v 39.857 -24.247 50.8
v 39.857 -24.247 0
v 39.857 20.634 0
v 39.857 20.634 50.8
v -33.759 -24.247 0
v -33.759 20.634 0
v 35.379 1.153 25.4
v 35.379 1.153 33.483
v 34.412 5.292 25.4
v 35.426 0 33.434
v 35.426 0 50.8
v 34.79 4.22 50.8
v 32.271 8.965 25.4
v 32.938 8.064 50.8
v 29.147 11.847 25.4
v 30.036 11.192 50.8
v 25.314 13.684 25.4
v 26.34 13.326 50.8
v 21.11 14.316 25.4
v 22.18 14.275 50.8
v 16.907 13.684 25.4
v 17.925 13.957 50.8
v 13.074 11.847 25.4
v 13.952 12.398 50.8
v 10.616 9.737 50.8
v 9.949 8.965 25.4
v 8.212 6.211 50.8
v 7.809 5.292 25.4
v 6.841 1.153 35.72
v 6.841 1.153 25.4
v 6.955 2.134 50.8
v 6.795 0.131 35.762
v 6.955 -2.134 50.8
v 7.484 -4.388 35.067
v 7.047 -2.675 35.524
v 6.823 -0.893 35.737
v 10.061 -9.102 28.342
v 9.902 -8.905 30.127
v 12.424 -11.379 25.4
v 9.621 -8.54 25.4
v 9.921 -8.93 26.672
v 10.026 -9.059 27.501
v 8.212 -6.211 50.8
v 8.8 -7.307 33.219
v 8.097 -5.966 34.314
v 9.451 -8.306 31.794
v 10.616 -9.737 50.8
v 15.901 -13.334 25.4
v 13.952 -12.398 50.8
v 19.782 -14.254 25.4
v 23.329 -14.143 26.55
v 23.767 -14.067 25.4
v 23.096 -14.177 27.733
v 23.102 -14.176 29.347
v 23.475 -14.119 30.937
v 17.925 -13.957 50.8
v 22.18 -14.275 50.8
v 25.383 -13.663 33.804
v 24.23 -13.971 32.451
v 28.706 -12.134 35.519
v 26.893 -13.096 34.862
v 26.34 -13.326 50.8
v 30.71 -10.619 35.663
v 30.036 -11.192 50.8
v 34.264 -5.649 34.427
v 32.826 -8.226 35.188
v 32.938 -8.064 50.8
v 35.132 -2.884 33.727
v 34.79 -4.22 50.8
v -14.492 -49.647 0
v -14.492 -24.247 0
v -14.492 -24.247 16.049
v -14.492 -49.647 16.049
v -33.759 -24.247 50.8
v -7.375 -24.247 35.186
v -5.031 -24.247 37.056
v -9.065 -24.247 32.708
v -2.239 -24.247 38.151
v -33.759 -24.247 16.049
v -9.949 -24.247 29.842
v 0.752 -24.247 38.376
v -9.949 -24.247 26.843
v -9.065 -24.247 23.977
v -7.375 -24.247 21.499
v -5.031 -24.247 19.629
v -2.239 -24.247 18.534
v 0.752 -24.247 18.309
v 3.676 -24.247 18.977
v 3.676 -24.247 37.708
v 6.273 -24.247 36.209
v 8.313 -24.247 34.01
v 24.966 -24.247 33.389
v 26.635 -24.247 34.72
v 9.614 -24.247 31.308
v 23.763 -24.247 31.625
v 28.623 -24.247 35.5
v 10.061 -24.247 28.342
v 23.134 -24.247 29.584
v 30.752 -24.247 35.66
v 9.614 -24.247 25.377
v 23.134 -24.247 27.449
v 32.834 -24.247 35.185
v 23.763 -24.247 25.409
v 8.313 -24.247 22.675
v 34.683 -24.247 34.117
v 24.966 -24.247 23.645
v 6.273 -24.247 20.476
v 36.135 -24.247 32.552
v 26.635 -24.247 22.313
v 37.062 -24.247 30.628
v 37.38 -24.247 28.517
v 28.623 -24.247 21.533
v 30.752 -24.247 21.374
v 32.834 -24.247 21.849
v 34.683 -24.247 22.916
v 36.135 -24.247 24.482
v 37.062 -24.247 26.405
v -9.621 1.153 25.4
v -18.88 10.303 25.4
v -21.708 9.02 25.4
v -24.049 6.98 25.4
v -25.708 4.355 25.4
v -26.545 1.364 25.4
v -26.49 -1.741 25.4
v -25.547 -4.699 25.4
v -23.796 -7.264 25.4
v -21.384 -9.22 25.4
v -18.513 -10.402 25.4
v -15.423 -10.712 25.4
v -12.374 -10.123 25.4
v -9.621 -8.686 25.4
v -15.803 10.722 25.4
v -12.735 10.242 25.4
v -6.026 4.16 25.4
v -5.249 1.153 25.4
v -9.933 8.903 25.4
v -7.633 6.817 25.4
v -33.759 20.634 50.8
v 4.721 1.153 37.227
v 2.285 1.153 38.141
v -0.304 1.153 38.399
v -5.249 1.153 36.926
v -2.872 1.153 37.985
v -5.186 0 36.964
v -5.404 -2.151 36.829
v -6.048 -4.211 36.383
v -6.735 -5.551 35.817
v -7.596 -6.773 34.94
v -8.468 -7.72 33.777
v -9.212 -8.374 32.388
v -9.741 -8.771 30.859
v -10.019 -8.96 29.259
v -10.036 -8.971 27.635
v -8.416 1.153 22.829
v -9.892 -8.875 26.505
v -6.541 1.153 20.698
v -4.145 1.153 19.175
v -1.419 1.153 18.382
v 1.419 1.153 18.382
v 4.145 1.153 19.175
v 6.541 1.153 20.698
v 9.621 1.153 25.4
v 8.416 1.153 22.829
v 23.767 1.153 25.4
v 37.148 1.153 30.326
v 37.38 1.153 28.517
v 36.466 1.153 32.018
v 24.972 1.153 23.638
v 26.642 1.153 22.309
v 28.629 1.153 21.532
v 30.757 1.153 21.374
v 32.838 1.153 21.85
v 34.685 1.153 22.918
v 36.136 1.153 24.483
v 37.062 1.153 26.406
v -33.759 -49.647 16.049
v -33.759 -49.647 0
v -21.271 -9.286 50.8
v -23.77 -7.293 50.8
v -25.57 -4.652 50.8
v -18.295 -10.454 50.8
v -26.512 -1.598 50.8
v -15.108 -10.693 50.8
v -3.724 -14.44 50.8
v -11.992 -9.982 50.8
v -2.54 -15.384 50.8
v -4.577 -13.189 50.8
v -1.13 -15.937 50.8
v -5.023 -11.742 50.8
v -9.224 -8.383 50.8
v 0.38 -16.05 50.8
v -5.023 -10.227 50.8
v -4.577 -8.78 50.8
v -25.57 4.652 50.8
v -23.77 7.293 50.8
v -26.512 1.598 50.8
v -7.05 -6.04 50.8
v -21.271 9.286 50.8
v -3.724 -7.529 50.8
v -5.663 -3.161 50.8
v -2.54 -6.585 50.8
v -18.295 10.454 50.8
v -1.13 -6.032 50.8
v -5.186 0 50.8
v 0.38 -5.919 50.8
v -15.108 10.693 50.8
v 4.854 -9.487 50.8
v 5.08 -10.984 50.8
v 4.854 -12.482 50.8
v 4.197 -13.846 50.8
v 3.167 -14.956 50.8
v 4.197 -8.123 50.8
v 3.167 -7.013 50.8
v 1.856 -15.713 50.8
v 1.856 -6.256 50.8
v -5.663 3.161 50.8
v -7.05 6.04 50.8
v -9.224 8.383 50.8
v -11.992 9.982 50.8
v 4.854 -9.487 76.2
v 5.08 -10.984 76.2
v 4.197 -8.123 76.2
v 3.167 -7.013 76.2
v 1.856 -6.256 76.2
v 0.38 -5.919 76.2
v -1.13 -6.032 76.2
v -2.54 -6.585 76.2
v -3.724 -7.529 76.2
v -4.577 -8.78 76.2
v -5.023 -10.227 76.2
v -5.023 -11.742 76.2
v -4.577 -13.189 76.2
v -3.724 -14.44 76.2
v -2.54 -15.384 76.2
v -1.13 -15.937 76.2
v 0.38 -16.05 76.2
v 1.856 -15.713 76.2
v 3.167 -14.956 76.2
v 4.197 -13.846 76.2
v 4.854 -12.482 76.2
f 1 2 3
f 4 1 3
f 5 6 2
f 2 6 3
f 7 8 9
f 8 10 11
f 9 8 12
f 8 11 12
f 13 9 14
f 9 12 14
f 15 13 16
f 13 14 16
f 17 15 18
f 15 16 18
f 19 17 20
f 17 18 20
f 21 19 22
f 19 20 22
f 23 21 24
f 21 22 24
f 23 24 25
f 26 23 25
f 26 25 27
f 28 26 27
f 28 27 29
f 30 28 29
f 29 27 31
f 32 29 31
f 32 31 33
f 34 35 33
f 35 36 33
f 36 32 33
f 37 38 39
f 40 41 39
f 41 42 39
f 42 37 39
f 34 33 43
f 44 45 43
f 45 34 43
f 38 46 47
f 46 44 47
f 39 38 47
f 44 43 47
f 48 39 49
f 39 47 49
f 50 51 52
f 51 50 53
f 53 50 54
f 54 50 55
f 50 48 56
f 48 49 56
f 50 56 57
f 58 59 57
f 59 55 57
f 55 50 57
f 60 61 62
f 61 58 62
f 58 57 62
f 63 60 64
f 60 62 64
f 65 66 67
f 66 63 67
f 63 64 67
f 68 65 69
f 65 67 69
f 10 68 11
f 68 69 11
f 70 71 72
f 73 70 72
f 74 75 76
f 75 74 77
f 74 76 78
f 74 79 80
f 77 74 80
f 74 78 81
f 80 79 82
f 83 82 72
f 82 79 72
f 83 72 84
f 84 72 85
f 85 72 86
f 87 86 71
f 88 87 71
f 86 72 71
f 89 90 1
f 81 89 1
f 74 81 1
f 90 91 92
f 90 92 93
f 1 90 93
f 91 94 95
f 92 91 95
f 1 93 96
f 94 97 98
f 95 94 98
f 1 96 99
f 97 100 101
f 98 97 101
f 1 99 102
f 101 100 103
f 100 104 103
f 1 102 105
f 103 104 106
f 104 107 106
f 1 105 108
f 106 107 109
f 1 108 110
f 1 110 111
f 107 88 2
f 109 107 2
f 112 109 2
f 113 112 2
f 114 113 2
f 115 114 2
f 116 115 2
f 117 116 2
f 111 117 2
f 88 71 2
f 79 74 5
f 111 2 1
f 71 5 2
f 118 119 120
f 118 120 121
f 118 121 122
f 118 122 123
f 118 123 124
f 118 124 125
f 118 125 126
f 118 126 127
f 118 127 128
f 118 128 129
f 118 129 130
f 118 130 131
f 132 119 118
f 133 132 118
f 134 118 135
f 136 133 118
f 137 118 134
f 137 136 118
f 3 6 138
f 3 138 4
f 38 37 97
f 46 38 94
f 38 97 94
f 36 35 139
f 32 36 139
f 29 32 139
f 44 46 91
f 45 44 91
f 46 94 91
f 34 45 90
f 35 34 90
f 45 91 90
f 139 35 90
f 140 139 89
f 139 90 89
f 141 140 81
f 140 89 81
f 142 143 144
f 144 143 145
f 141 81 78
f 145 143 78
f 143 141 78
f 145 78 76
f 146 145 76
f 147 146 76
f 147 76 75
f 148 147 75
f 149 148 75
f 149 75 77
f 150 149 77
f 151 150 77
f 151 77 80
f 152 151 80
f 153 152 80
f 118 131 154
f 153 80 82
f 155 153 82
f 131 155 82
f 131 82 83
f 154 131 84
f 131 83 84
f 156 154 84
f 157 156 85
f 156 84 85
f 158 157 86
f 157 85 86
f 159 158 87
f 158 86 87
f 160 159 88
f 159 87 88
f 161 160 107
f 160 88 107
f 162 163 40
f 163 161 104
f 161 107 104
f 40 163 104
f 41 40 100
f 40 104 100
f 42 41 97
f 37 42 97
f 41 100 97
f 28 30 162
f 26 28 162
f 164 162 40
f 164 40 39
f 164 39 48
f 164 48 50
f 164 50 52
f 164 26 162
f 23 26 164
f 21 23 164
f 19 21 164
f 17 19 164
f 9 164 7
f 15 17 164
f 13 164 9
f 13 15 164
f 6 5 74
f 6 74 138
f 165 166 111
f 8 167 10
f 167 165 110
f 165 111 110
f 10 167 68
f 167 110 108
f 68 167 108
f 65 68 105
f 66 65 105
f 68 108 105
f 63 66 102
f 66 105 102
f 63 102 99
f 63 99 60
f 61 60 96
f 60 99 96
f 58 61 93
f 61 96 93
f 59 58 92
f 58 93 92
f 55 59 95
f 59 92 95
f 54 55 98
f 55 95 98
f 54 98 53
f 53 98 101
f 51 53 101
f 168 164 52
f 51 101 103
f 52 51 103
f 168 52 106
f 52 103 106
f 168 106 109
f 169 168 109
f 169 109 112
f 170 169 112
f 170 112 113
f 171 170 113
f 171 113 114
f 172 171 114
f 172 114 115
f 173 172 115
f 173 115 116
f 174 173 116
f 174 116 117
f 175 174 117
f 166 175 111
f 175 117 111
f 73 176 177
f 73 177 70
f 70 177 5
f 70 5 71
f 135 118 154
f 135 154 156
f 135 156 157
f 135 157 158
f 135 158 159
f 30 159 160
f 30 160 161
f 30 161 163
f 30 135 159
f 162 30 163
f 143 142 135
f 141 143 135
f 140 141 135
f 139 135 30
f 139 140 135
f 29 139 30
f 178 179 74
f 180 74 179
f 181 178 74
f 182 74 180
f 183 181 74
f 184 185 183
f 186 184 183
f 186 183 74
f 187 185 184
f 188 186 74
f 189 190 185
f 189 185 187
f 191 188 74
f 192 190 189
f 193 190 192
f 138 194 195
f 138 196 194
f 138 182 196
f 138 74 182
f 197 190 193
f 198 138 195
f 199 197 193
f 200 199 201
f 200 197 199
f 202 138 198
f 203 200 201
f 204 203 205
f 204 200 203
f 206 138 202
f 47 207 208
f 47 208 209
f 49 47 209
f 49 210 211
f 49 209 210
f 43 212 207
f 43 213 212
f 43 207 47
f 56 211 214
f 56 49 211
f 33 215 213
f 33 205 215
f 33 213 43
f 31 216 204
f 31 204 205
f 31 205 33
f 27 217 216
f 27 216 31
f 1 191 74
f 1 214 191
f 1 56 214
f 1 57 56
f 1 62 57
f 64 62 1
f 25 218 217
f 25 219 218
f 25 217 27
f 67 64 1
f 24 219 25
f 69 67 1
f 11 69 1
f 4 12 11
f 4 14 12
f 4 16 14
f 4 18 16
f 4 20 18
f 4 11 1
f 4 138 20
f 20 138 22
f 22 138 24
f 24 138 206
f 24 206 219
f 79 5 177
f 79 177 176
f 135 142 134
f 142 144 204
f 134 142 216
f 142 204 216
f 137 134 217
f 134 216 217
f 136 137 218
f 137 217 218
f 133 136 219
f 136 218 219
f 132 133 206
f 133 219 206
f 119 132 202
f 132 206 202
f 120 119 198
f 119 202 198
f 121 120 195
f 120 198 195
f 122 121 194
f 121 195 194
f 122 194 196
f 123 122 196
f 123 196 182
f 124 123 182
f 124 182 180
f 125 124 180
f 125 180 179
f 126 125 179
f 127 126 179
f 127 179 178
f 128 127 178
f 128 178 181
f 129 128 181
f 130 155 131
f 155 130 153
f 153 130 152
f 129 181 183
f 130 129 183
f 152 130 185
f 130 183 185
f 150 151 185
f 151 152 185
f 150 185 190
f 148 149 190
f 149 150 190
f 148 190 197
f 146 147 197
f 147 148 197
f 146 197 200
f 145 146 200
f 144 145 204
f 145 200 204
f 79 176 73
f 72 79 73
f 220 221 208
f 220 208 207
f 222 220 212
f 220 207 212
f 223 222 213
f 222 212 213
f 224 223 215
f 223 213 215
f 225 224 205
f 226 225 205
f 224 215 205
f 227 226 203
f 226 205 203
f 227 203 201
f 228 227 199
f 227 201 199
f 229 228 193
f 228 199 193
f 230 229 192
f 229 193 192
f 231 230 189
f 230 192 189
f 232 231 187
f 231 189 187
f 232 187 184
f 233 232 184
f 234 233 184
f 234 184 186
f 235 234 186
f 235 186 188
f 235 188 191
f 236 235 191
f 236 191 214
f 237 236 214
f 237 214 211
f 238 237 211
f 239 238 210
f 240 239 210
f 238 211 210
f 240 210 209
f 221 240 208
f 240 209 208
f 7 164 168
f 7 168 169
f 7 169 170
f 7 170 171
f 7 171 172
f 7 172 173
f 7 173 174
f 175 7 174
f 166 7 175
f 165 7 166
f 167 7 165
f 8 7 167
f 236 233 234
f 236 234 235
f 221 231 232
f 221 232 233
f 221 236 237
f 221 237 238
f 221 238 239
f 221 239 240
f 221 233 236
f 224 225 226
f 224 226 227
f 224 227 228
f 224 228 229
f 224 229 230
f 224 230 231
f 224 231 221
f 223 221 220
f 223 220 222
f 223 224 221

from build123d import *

# Parameters (mm, degrees)
F0_W      = 73.615912
F0_H      = 44.880818
F1_DEPTH  = 50.8
F2_R      = 10.722735
F2_R_2    = 14.315515
F3_DEPTH  = 25.4
F4_R      = 5.08
F5_DEPTH  = 25.4
F6_R      = 10.061194
F7_DEPTH  = 25.4
F8_R      = 7.163215
F9_DEPTH  = 25.4
F10_W     = 19.266809
F10_H     = 16.048783
F11_DEPTH = 25.4


with BuildPart() as f1:
    # F0 (on Top) → F1 (new body)
    with BuildSketch(Plane.XY):
        with Locations((3.049085, -1.806261)):
            Rectangle(F0_W, F0_H)
    extrude(amount=F1_DEPTH)

    # F2 (on face) → F3 (cut)
    with BuildSketch(Plane.XY.offset(50.8)):
        with Locations((-15.909195, 0)):
            Circle(F2_R)
        with Locations((21.110246, 0)):
            Circle(F2_R_2)
    extrude(amount=-F3_DEPTH, mode=Mode.SUBTRACT)

    # F4 (on face) → F5 (join)
    with BuildSketch(Plane.XY.offset(50.8)):
        with Locations((0, -10.984484)):
            Circle(F4_R)
    extrude(amount=F5_DEPTH)

    # F6 (on face) → F7 (cut)
    with BuildSketch(Plane.XZ.offset(24.24667)):
        with Locations((0, 28.342469)):
            Circle(F6_R)
    extrude(amount=-F7_DEPTH, mode=Mode.SUBTRACT)

    # F8 (on face) → F9 (cut)
    with BuildSketch(Plane.XZ.offset(24.24667)):
        with Locations((30.216709, 28.516769)):
            Circle(F8_R)
    extrude(amount=-F9_DEPTH, mode=Mode.SUBTRACT)

    # F10 (on face) → F11 (join)
    with BuildSketch(Plane.XZ.offset(24.24667)):
        with Locations((-24.125466, 8.024392)):
            Rectangle(F10_W, F10_H)
    extrude(amount=F11_DEPTH)


solid = f1.part
